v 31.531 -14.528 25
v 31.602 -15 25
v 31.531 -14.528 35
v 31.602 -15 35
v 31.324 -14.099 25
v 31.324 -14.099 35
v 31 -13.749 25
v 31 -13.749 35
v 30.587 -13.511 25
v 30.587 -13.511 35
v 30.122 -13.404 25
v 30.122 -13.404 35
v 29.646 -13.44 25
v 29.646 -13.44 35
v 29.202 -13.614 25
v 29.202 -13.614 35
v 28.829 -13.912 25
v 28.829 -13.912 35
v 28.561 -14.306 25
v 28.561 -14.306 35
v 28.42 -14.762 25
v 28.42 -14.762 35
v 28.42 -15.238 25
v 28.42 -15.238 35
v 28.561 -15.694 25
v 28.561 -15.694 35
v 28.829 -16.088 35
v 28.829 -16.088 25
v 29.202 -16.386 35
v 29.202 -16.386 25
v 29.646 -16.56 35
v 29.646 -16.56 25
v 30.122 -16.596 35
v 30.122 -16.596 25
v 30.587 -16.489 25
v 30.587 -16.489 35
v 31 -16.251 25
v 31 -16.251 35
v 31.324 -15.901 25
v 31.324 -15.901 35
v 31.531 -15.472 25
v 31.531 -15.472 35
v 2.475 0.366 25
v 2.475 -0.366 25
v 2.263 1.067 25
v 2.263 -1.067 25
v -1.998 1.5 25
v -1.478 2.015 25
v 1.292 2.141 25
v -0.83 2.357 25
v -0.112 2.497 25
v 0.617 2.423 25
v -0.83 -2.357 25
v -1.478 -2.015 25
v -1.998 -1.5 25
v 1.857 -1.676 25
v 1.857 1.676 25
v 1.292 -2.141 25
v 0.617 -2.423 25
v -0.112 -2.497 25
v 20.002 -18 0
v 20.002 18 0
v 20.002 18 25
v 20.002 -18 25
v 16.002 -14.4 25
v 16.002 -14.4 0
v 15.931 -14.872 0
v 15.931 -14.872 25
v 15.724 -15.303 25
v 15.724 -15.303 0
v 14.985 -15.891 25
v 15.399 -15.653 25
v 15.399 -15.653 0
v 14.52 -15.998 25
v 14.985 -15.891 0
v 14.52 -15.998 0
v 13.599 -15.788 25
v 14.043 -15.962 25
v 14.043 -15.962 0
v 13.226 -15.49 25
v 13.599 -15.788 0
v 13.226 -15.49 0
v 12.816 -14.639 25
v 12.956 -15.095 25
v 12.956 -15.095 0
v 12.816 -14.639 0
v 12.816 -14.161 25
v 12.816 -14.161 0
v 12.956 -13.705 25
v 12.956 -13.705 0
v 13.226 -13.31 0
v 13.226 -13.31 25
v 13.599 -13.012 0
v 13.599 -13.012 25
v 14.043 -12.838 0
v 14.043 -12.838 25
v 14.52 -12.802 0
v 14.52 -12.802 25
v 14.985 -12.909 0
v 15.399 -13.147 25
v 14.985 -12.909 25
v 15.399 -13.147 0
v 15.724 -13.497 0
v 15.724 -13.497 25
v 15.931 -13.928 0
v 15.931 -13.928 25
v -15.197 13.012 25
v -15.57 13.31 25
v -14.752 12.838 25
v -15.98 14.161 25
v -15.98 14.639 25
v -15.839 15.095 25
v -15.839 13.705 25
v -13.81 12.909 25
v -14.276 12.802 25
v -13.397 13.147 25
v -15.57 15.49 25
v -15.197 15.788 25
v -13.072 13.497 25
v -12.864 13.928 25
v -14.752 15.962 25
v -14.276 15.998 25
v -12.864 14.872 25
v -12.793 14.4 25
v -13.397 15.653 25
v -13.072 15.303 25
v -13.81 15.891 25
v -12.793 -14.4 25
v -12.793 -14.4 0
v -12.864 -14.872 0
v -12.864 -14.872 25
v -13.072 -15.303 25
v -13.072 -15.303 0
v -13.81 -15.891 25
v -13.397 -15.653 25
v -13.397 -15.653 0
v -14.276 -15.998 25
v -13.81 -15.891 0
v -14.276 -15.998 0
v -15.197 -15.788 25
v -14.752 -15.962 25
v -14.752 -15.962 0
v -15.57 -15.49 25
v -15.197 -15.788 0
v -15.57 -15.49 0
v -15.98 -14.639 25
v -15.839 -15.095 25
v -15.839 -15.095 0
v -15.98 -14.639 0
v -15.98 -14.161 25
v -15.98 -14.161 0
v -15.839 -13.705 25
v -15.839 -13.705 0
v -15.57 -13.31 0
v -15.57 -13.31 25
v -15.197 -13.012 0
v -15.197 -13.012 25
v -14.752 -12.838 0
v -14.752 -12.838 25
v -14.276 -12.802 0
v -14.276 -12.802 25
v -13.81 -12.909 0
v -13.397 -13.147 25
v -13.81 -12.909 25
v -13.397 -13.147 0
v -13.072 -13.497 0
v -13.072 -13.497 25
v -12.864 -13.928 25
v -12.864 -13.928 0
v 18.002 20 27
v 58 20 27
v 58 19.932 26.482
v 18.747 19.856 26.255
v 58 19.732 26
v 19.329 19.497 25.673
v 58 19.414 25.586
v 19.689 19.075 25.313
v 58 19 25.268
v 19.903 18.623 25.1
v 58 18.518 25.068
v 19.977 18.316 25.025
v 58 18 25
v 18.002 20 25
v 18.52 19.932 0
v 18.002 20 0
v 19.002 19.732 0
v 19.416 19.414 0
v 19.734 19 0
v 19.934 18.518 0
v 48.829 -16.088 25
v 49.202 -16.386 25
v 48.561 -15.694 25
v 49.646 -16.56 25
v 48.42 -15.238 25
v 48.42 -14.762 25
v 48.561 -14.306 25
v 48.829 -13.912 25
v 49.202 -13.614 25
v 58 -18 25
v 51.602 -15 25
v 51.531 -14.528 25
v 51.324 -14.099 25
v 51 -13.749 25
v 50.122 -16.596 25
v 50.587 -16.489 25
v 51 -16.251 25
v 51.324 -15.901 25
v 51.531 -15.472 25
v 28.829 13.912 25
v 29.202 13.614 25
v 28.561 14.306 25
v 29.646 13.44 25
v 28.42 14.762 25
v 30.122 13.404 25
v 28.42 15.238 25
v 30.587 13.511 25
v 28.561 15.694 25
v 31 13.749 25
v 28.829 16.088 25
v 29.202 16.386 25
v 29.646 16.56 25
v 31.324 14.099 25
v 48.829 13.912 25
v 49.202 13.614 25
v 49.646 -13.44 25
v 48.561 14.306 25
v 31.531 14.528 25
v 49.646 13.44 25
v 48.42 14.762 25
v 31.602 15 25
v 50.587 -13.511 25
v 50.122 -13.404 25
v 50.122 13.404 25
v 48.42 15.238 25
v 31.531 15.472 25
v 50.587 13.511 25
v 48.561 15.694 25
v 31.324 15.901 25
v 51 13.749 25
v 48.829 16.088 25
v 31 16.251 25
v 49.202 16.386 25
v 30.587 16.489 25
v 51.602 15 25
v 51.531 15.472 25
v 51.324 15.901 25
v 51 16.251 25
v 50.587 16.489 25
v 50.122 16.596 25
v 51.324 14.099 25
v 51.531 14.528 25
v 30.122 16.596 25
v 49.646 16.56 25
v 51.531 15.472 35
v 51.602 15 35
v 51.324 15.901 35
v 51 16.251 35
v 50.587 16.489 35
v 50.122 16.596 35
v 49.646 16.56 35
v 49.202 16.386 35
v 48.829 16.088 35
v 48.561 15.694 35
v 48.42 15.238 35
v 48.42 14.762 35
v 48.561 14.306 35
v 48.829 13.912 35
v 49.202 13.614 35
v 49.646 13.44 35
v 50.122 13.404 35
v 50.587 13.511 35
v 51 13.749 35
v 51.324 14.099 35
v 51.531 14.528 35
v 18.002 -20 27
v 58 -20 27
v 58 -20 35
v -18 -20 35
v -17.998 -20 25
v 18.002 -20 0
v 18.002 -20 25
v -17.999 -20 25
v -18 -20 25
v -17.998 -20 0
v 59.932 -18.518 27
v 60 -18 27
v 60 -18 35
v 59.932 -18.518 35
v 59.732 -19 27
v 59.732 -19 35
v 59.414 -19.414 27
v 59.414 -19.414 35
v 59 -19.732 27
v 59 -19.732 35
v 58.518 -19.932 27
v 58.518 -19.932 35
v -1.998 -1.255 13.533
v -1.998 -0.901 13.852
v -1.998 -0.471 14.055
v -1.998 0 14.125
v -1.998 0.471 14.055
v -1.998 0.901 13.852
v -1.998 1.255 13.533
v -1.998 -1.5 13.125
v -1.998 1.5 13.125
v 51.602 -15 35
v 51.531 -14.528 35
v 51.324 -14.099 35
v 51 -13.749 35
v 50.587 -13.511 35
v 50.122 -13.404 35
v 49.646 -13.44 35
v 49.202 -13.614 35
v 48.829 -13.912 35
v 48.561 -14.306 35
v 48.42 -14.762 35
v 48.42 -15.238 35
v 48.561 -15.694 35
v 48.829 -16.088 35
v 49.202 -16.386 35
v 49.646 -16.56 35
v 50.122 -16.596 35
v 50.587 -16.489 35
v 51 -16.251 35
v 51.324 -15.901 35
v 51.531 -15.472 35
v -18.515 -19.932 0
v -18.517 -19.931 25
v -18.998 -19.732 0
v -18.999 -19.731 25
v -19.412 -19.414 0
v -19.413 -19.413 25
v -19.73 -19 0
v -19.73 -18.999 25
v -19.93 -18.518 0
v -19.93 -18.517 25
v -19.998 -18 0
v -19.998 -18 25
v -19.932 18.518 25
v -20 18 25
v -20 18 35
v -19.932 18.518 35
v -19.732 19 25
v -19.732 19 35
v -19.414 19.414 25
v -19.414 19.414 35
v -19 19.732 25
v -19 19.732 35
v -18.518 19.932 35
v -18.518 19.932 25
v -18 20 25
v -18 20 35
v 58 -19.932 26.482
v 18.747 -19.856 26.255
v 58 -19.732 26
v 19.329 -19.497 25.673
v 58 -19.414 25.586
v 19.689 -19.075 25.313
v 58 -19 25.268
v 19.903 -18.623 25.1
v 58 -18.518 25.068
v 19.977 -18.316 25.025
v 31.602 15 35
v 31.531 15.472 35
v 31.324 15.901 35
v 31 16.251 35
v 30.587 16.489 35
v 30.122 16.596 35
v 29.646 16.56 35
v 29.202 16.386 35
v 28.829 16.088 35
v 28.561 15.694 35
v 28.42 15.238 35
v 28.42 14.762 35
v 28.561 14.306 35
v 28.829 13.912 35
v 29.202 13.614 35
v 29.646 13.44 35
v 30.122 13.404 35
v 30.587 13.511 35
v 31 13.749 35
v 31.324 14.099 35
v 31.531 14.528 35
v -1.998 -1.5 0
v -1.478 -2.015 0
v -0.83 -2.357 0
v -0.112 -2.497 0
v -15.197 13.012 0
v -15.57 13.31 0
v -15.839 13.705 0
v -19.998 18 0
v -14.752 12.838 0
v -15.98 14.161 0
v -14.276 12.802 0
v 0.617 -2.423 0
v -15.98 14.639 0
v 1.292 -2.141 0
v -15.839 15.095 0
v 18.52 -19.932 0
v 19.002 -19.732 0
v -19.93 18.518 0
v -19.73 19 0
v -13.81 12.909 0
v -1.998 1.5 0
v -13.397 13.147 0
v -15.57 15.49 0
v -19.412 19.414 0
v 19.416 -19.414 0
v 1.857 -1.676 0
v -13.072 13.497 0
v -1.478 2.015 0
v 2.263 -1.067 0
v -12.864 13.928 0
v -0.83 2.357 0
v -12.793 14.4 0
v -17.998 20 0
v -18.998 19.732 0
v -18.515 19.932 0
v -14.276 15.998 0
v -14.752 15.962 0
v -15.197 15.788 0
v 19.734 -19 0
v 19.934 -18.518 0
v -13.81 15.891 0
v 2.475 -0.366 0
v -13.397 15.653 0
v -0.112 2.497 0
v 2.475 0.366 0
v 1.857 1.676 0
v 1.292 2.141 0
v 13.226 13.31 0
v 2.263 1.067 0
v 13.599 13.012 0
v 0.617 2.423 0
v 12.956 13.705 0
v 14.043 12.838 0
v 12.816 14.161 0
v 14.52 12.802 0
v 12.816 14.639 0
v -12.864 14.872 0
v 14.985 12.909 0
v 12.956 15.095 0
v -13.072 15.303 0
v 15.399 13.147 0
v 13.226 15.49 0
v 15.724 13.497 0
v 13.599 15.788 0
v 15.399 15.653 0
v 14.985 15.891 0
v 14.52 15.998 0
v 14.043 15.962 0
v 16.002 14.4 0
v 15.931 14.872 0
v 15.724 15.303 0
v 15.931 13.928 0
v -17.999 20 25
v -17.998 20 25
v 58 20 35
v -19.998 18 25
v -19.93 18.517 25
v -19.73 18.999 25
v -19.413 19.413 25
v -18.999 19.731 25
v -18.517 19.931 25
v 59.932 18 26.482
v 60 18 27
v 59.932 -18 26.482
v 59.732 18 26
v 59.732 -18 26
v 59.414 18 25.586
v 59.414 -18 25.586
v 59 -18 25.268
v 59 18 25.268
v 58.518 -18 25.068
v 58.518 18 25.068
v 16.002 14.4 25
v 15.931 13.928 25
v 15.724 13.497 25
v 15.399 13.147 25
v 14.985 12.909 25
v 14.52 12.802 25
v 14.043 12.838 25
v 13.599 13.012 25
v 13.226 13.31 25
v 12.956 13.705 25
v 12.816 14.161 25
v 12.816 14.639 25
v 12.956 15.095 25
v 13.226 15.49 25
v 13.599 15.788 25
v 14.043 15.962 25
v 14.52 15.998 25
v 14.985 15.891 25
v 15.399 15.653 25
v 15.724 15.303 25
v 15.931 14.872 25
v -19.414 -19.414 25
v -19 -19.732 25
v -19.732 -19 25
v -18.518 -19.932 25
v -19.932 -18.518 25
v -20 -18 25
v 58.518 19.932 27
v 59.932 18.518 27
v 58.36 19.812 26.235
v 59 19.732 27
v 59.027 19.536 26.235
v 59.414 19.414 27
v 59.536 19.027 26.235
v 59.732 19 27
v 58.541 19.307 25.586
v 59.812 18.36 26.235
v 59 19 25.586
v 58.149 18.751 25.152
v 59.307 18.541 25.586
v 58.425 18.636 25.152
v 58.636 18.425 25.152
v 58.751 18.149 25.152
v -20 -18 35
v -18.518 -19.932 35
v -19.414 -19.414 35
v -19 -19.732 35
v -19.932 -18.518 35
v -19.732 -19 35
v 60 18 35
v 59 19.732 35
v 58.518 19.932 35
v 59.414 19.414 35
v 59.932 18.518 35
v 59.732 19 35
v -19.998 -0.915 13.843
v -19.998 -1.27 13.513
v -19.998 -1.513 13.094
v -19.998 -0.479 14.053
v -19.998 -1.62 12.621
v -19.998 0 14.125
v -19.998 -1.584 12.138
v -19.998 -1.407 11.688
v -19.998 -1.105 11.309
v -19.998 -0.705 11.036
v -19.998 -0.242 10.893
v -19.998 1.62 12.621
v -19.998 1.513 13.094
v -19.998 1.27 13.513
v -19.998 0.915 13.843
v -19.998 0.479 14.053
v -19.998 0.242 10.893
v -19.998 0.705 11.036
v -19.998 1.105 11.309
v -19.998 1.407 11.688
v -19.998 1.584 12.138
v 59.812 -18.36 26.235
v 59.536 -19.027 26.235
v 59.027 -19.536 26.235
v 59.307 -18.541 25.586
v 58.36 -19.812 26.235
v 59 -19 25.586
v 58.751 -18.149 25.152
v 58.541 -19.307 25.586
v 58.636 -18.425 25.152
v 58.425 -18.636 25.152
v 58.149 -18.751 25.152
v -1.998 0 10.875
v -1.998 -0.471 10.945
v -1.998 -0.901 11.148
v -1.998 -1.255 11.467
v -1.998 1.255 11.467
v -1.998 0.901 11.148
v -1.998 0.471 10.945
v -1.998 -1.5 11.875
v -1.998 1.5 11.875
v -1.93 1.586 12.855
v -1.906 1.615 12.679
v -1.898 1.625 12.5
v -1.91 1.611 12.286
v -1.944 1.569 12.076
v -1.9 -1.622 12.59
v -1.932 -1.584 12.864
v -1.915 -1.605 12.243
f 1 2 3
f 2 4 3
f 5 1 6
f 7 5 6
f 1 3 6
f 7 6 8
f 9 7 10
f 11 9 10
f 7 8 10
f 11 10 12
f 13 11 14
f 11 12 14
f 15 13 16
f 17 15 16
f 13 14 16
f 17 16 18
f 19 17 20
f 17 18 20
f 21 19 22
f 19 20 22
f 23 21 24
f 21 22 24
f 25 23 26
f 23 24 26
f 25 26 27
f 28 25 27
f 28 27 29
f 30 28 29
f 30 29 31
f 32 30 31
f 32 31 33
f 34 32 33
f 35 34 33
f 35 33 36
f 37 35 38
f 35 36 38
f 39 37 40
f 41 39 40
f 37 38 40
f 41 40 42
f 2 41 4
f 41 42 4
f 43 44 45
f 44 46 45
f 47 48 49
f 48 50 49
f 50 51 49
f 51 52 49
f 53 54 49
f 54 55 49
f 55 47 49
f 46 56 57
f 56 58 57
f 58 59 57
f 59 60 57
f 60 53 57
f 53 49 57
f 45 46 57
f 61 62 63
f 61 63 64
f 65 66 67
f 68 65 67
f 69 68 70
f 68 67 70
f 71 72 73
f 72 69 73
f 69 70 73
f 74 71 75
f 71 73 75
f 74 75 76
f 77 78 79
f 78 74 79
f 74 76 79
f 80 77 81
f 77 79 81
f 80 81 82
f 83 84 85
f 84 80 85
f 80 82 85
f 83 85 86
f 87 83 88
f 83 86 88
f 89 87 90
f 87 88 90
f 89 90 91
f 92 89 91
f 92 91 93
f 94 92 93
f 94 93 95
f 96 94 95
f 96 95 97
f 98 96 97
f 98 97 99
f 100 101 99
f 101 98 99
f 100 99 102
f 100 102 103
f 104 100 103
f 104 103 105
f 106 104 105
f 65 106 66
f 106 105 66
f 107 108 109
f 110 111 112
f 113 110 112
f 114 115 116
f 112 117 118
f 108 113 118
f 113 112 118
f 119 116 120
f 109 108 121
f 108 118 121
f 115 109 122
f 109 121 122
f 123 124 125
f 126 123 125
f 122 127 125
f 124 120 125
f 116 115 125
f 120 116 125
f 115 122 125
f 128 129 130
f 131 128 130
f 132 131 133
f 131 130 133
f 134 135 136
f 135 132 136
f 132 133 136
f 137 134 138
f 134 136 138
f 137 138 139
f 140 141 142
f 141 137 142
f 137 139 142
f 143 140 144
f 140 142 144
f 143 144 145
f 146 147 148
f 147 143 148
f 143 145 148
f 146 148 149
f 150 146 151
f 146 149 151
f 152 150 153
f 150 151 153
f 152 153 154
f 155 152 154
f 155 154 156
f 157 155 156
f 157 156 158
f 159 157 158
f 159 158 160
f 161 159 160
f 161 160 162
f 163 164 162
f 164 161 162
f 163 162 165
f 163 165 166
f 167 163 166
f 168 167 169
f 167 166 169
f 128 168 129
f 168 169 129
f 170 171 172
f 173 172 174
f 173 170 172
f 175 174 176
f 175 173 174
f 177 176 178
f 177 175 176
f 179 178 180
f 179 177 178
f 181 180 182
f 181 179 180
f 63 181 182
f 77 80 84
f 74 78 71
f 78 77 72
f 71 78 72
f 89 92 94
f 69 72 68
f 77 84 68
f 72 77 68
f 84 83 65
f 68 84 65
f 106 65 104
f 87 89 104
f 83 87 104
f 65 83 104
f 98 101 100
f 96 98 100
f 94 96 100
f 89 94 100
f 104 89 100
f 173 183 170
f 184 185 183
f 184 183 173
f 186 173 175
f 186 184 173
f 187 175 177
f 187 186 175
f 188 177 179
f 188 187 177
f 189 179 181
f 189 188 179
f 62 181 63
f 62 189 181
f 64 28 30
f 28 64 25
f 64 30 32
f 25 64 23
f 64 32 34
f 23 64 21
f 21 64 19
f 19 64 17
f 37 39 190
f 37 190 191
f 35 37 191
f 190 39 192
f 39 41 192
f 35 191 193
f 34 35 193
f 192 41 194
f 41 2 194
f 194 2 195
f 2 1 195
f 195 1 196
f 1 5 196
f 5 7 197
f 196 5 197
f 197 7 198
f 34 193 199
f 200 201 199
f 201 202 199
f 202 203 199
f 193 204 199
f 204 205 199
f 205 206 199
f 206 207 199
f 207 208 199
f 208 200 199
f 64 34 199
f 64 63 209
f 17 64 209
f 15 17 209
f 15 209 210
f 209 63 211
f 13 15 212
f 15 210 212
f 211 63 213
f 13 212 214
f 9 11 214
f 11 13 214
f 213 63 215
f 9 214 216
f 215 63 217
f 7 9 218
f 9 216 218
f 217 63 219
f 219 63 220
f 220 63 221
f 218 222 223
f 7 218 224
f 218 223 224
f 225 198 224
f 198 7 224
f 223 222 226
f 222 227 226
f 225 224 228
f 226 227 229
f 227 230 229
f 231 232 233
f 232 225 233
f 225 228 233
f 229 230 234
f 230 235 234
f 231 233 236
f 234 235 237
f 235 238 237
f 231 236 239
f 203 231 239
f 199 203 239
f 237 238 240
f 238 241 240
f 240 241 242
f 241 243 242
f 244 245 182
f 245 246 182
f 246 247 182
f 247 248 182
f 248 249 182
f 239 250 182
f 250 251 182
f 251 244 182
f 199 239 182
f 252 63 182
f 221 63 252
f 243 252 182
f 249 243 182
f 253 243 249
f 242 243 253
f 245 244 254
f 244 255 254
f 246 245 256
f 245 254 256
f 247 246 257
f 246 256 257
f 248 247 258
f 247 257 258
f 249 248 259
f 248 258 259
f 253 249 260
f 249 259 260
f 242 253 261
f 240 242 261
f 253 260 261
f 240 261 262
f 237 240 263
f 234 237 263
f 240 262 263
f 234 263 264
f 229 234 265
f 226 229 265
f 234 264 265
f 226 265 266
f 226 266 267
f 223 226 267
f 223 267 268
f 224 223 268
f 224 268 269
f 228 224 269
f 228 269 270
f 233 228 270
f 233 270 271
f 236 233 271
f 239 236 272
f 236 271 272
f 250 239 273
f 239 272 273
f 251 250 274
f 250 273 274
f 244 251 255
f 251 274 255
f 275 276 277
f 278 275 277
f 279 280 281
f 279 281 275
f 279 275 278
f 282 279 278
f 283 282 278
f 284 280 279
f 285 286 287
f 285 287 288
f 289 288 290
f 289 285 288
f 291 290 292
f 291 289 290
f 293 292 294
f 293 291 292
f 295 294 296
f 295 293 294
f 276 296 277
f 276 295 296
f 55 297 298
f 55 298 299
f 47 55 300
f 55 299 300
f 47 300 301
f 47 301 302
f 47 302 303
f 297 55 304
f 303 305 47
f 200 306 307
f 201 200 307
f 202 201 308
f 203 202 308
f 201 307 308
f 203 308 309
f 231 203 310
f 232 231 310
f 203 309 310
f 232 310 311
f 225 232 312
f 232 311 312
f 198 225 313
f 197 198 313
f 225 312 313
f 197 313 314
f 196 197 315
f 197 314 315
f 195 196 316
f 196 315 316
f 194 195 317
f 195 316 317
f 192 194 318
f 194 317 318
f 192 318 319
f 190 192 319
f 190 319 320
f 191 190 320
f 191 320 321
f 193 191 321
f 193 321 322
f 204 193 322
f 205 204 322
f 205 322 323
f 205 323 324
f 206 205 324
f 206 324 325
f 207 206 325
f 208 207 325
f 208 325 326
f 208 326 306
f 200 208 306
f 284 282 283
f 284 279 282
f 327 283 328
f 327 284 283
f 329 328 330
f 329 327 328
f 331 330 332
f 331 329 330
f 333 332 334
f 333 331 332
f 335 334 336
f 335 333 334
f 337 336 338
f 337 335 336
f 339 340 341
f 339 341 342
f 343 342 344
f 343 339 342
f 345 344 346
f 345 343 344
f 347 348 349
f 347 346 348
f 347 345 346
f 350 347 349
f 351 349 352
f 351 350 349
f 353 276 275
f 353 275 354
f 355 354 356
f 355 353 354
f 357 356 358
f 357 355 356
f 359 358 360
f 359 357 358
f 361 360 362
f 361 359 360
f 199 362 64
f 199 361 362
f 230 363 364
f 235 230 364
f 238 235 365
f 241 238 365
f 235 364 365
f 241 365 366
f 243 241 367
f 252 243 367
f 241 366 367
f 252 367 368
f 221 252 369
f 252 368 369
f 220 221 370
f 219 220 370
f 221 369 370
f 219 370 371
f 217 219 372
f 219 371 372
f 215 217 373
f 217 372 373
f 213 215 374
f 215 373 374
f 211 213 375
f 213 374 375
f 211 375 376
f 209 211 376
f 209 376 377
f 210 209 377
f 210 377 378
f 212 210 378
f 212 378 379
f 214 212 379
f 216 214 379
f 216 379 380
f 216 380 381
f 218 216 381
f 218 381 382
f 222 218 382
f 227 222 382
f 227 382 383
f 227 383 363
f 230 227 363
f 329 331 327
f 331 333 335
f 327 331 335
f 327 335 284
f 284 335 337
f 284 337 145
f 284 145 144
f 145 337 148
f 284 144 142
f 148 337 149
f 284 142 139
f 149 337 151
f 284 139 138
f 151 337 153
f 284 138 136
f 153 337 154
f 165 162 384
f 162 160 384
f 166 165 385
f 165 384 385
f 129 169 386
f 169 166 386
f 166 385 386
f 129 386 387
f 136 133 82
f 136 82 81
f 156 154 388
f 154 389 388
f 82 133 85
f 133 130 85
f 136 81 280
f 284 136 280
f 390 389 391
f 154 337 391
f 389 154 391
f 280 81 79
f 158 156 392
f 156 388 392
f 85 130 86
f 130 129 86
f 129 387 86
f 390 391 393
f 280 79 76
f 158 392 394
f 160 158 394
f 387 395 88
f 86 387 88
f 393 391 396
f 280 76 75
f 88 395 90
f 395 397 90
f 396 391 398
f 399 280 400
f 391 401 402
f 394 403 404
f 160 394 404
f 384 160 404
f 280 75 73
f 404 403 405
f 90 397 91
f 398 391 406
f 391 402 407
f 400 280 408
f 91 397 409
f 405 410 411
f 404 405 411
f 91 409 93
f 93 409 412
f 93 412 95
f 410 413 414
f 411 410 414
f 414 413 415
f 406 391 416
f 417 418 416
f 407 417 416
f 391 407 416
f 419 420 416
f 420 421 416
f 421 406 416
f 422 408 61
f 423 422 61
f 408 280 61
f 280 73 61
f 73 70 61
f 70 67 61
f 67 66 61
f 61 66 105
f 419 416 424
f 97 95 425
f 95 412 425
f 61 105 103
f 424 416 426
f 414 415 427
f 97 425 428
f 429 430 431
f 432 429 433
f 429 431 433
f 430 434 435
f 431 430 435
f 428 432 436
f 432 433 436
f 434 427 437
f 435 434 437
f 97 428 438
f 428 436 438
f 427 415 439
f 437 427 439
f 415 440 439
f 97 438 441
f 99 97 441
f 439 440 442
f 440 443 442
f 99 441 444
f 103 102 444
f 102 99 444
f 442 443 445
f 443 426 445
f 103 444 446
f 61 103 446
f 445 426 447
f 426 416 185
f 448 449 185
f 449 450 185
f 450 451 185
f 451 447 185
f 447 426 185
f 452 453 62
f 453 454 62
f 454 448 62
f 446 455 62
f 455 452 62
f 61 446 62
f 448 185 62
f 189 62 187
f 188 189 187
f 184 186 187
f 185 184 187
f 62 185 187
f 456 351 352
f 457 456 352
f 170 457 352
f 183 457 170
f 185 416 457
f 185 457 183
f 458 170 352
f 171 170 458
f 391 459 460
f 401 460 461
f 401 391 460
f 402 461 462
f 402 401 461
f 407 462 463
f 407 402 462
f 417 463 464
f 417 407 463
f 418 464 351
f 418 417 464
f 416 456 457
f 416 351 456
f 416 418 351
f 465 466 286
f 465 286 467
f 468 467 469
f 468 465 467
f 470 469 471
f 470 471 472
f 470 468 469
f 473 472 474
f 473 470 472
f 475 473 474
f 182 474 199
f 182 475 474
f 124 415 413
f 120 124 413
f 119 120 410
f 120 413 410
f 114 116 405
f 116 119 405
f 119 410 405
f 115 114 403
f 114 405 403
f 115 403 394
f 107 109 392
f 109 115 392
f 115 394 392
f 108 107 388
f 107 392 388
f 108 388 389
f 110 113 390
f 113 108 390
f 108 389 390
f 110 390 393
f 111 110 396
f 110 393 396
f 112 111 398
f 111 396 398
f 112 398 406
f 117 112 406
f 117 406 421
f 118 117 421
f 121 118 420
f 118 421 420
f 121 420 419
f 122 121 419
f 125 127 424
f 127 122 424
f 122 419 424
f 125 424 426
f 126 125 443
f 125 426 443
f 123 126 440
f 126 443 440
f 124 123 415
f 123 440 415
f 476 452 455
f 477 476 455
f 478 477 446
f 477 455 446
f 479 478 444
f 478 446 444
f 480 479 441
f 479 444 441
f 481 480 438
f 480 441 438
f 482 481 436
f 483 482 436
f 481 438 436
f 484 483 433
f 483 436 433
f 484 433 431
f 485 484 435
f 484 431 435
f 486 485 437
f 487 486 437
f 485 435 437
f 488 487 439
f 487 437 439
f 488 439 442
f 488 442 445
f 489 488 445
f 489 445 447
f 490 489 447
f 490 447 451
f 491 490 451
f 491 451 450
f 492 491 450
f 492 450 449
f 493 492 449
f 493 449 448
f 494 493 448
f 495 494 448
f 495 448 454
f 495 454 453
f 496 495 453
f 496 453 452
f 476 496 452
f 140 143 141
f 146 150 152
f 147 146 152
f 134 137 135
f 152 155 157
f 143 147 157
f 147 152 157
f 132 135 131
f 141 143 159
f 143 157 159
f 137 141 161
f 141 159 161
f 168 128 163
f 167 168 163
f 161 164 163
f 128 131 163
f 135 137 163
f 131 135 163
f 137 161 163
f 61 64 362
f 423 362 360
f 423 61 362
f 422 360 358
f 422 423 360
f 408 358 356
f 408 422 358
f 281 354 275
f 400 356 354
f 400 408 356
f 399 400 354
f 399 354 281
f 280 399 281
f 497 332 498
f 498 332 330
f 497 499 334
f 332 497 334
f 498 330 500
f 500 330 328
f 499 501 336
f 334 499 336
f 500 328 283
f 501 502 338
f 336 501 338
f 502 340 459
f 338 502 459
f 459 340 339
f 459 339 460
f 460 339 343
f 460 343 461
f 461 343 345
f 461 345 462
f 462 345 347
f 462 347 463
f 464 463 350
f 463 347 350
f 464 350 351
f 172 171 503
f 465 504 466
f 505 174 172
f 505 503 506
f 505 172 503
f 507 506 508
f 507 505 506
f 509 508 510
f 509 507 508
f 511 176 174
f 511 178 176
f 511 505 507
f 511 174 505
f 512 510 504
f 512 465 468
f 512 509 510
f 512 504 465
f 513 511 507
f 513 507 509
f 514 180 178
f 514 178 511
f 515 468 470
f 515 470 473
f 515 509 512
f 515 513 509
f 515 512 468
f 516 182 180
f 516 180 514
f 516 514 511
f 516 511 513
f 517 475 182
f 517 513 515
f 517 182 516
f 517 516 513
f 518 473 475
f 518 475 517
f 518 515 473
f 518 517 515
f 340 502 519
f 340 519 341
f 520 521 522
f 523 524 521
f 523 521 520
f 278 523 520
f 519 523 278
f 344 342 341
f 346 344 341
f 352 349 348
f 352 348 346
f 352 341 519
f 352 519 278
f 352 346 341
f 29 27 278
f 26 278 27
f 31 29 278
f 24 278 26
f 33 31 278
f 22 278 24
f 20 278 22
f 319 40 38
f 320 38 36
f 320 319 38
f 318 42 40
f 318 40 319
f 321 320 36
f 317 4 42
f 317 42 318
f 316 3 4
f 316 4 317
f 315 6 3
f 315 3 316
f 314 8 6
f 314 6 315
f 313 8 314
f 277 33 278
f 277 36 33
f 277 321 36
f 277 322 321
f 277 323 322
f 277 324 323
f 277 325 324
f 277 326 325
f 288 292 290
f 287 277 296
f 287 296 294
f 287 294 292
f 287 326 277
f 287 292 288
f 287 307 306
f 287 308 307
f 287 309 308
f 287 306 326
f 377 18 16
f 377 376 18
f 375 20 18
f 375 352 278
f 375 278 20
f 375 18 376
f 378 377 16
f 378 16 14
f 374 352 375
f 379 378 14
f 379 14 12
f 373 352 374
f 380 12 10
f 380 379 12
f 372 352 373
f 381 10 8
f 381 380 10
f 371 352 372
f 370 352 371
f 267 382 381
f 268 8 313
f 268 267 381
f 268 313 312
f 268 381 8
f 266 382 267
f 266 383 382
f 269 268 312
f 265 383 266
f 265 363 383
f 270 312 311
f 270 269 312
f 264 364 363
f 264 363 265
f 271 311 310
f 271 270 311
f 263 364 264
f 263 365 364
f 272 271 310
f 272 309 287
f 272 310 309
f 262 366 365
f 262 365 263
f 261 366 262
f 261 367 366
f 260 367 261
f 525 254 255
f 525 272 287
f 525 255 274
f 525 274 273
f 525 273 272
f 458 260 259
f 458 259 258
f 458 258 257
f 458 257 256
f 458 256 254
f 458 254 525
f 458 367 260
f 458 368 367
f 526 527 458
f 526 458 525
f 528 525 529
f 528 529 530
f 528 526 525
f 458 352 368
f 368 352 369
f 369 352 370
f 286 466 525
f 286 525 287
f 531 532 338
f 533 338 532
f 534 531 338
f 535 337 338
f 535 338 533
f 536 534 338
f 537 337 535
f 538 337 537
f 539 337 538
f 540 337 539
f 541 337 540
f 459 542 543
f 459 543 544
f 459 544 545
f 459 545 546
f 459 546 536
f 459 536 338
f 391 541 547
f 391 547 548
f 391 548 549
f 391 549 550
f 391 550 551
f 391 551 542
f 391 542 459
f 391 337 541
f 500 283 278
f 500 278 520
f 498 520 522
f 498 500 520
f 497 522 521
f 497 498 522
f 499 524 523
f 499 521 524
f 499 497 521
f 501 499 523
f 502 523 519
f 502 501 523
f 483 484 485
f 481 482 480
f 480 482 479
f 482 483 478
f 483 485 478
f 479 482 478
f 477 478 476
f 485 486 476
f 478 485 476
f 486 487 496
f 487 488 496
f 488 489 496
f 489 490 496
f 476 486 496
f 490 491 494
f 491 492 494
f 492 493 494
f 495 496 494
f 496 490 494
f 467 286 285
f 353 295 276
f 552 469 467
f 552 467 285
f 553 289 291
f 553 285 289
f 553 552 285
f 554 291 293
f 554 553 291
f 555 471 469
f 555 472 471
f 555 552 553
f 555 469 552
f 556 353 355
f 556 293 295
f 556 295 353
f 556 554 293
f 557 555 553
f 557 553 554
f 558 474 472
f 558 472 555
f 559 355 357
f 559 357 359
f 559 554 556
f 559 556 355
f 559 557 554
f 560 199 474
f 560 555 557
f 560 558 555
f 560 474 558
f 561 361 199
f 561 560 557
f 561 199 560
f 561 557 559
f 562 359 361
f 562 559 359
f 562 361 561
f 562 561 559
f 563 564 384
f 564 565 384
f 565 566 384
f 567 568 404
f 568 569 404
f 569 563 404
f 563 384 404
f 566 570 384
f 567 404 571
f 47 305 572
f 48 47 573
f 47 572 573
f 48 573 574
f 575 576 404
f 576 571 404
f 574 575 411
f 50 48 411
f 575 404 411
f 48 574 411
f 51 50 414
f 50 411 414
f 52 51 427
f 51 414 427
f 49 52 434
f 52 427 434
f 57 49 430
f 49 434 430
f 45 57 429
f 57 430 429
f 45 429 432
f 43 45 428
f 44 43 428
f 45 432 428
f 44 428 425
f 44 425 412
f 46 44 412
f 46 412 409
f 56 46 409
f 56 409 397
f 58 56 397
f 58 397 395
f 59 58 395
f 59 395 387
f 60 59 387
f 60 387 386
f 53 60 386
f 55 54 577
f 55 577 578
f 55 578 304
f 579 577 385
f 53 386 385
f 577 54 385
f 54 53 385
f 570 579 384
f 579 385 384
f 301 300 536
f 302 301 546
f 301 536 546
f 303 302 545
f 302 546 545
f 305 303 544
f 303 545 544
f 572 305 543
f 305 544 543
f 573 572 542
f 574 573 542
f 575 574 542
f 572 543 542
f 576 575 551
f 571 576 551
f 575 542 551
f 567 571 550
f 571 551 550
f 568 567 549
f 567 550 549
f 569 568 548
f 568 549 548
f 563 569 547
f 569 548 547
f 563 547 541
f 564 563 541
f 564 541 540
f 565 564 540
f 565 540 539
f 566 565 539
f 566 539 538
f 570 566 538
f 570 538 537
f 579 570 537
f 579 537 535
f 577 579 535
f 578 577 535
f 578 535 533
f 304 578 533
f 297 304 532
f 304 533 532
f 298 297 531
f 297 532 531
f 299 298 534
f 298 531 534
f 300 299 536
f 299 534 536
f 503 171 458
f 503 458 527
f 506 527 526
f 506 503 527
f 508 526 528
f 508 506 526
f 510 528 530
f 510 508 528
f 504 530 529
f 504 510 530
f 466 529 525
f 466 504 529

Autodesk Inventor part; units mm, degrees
ref_plane "YZ Plane" through (0, 0, 0) normal (1, 0, 0) x (0, 1, 0)
ref_plane "XZ Plane" through (0, 0, 0) normal (0, 1, 0) x (-1, 0, 0)
ref_plane "XY Plane" through (0, 0, 0) normal (0, 0, 1) x (1, 0, 0)
sketch "Sketch1" plane through (0, 0, 0) normal (0, 0, 1) x (1, 0, 0)
  arc A0 (-1.9978, -1.5) -> (-1.9978, 1.5) centre (0.0022, 0) ccw
  line L0 (2.5022, 0) -> (-1.9978, 0)
  line L1 (-1.9978, 0) -> (-1.9978, 1.5)
  line L2 (-1.9978, 0) -> (-1.9978, -1.5)
  line L3 (0.0022, 0) -> (20.0022, 0)
  line L4 (0.0022, 0) -> (0.0022, -20)
  line L5 (18.0022, -20) -> (-17.9978, -20)
  line L6 (-19.9978, -18) -> (-19.9978, 18)
  line L7 (-17.9978, 20) -> (18.0022, 20)
  line L8 (20.0022, 18) -> (20.0022, -18)
  line L9 (14.4, 14.4) -> (14.4, 20)
  line L10 (20.0022, 14.4) -> (16.0022, 14.4)
  circle A1 centre (14.4, 14.4) radius 1.6022
  circle A2 centre (14.4, -14.4) radius 1.6022
  circle A3 centre (-14.3955, 14.4) radius 1.6022
  circle A4 centre (-14.3955, -14.4) radius 1.6022
  arc A5 (-17.9978, 20) -> (-19.9978, 18) centre (-17.9978, 18) ccw
  arc A6 (20.0022, 18) -> (18.0022, 20) centre (18.0022, 18) ccw
  arc A7 (18.0022, -20) -> (20.0022, -18) centre (18.0022, -18) ccw
  arc A8 (-19.9978, -18) -> (-17.9978, -20) centre (-17.9978, -18) ccw
  point P0 (0, 0)
  point P1 (0.2522, 0)
  point P2 (-1.9978, 0.75)
  point P3 (-19.9978, 20)
  point P4 (-19.9978, -20)
  point P5 (20.0022, 20)
  dimension "d0" = 5
  dimension "d1" = 4.5
  dimension "d21" = 20
  dimension "d22" = 20
  dimension "d23" = 40
  dimension "d24" = 40
  dimension "d25" = 20
  dimension "d26" = 5.6
  dimension "d27" = 4
  dimension "d28" = 2
extrude "Extrusion1" add sketch "Sketch1" along normal blind 25 contours L3 L8 A7 L5 L4 A0 | A0 L1 L2 L4 L5 A8 L6 A5 L7 L9 A1 L10 L8 L3 | L10 A1 L9 L7 A6 L8
sketch "Sketch2" plane through (-19.9978, -18, 0) normal (-1, 0, 0) x (0, 0, 1)
  line L0 (0, 38) -> (25, 38) projected
  line L1 (0, 38) -> (12.5, 38)
  line L2 (12.5, 38) -> (12.5, 19.625)
  line L3 (12.5, 18) -> (0, 18)
  line L4 (0, 18) -> (0, 38)
  circle A0 centre (12.5, 18) radius 1.625
  dimension "d33" = 3.25
  dimension "d31" = 12.5
  dimension "d32" = 20
extrude "Extrusion2" cut sketch "Sketch2" against normal blind 20 contours A0
sketch "Sketch3" plane through (0, 0, 25) normal (0, 0, 1) x (1, 0, 0)
  line L0 (58, -20) -> (-18, -20)
  line L1 (-20, -18) -> (-20, 18)
  line L2 (-18, 20) -> (58, 20)
  line L3 (60, 18) -> (60, -18)
  arc A0 (58, -20) -> (60, -18) centre (58, -18) ccw
  arc A1 (60, 18) -> (58, 20) centre (58, 18) ccw
  arc A2 (-18, 20) -> (-20, 18) centre (-18, 18) ccw
  arc A3 (-20, -18) -> (-18, -20) centre (-18, -18) ccw
  point P0 (0, 0)
  dimension "d36" = 60
  dimension "d37" = 20
  dimension "d38" = 20
  dimension "d39" = 20
  dimension "d40" = 2
extrude "Extrusion3" add sketch "Sketch3" along normal blind 10
sketch "Sketch7" plane through (0, 0, 35) normal (0, 0, 1) x (1, 0, 0)
  line L0 (55.0022, 20) -> (50.0022, 20)
  line L1 (50.0022, 20) -> (50.0022, 15)
  line L2 (50.0022, 15) -> (55.0022, 15)
  line L3 (55.0022, 15) -> (55.0022, 20)
  circle A0 centre (50.0022, 15) radius 1.6
  line L4 (18.0022, 20) -> (-17.9978, 20) projected
  line L5 (0.0022, 20) -> (60.0022, 20)
  line L6 (60.0022, 20) -> (60.0022, -20)
  line L7 (60.0022, -20) -> (0.0022, -20)
  line L8 (0.0022, -20) -> (0.0022, 20)
  circle A1 centre (50.0022, -15) radius 1.6
  line L9 (60.0022, -20) -> (20.0022, -20)
  line L10 (20.0022, -20) -> (20.0022, 20)
  line L11 (20.0022, 20) -> (60.0022, 20)
  line L12 (60.0022, 20) -> (60.0022, -20)
  line L13 (58, 20) -> (-18, 20) projected
  line L14 (40.0022, 20) -> (40.0022, -20)
  circle A2 centre (30.0022, 15) radius 1.6
  circle A3 centre (30.0022, -15) radius 1.6
  point P0 (0, 0)
  dimension "d73" = 5
  dimension "d74" = 5
  dimension "d75" = 3.2
  dimension "d78" = 60
  dimension "d81" = 60
  dimension "d85" = 40
  dimension "d86" = 30
  dimension "d87" = 20
extrude "Extrusion6" cut sketch "Sketch7" against normal blind 20 contours A0 L2 L1 | L1 L2 A0 | A1 | A2 | A3
fillet "Fillet3" radius 2 5 edges at (59.4142, -19.4142, 25) (60, 0, 25) (59.4142, 19.4142, 25) (38.0011, 20, 25) (38.0011, -20, 25)
properties part number "afterdesign"
